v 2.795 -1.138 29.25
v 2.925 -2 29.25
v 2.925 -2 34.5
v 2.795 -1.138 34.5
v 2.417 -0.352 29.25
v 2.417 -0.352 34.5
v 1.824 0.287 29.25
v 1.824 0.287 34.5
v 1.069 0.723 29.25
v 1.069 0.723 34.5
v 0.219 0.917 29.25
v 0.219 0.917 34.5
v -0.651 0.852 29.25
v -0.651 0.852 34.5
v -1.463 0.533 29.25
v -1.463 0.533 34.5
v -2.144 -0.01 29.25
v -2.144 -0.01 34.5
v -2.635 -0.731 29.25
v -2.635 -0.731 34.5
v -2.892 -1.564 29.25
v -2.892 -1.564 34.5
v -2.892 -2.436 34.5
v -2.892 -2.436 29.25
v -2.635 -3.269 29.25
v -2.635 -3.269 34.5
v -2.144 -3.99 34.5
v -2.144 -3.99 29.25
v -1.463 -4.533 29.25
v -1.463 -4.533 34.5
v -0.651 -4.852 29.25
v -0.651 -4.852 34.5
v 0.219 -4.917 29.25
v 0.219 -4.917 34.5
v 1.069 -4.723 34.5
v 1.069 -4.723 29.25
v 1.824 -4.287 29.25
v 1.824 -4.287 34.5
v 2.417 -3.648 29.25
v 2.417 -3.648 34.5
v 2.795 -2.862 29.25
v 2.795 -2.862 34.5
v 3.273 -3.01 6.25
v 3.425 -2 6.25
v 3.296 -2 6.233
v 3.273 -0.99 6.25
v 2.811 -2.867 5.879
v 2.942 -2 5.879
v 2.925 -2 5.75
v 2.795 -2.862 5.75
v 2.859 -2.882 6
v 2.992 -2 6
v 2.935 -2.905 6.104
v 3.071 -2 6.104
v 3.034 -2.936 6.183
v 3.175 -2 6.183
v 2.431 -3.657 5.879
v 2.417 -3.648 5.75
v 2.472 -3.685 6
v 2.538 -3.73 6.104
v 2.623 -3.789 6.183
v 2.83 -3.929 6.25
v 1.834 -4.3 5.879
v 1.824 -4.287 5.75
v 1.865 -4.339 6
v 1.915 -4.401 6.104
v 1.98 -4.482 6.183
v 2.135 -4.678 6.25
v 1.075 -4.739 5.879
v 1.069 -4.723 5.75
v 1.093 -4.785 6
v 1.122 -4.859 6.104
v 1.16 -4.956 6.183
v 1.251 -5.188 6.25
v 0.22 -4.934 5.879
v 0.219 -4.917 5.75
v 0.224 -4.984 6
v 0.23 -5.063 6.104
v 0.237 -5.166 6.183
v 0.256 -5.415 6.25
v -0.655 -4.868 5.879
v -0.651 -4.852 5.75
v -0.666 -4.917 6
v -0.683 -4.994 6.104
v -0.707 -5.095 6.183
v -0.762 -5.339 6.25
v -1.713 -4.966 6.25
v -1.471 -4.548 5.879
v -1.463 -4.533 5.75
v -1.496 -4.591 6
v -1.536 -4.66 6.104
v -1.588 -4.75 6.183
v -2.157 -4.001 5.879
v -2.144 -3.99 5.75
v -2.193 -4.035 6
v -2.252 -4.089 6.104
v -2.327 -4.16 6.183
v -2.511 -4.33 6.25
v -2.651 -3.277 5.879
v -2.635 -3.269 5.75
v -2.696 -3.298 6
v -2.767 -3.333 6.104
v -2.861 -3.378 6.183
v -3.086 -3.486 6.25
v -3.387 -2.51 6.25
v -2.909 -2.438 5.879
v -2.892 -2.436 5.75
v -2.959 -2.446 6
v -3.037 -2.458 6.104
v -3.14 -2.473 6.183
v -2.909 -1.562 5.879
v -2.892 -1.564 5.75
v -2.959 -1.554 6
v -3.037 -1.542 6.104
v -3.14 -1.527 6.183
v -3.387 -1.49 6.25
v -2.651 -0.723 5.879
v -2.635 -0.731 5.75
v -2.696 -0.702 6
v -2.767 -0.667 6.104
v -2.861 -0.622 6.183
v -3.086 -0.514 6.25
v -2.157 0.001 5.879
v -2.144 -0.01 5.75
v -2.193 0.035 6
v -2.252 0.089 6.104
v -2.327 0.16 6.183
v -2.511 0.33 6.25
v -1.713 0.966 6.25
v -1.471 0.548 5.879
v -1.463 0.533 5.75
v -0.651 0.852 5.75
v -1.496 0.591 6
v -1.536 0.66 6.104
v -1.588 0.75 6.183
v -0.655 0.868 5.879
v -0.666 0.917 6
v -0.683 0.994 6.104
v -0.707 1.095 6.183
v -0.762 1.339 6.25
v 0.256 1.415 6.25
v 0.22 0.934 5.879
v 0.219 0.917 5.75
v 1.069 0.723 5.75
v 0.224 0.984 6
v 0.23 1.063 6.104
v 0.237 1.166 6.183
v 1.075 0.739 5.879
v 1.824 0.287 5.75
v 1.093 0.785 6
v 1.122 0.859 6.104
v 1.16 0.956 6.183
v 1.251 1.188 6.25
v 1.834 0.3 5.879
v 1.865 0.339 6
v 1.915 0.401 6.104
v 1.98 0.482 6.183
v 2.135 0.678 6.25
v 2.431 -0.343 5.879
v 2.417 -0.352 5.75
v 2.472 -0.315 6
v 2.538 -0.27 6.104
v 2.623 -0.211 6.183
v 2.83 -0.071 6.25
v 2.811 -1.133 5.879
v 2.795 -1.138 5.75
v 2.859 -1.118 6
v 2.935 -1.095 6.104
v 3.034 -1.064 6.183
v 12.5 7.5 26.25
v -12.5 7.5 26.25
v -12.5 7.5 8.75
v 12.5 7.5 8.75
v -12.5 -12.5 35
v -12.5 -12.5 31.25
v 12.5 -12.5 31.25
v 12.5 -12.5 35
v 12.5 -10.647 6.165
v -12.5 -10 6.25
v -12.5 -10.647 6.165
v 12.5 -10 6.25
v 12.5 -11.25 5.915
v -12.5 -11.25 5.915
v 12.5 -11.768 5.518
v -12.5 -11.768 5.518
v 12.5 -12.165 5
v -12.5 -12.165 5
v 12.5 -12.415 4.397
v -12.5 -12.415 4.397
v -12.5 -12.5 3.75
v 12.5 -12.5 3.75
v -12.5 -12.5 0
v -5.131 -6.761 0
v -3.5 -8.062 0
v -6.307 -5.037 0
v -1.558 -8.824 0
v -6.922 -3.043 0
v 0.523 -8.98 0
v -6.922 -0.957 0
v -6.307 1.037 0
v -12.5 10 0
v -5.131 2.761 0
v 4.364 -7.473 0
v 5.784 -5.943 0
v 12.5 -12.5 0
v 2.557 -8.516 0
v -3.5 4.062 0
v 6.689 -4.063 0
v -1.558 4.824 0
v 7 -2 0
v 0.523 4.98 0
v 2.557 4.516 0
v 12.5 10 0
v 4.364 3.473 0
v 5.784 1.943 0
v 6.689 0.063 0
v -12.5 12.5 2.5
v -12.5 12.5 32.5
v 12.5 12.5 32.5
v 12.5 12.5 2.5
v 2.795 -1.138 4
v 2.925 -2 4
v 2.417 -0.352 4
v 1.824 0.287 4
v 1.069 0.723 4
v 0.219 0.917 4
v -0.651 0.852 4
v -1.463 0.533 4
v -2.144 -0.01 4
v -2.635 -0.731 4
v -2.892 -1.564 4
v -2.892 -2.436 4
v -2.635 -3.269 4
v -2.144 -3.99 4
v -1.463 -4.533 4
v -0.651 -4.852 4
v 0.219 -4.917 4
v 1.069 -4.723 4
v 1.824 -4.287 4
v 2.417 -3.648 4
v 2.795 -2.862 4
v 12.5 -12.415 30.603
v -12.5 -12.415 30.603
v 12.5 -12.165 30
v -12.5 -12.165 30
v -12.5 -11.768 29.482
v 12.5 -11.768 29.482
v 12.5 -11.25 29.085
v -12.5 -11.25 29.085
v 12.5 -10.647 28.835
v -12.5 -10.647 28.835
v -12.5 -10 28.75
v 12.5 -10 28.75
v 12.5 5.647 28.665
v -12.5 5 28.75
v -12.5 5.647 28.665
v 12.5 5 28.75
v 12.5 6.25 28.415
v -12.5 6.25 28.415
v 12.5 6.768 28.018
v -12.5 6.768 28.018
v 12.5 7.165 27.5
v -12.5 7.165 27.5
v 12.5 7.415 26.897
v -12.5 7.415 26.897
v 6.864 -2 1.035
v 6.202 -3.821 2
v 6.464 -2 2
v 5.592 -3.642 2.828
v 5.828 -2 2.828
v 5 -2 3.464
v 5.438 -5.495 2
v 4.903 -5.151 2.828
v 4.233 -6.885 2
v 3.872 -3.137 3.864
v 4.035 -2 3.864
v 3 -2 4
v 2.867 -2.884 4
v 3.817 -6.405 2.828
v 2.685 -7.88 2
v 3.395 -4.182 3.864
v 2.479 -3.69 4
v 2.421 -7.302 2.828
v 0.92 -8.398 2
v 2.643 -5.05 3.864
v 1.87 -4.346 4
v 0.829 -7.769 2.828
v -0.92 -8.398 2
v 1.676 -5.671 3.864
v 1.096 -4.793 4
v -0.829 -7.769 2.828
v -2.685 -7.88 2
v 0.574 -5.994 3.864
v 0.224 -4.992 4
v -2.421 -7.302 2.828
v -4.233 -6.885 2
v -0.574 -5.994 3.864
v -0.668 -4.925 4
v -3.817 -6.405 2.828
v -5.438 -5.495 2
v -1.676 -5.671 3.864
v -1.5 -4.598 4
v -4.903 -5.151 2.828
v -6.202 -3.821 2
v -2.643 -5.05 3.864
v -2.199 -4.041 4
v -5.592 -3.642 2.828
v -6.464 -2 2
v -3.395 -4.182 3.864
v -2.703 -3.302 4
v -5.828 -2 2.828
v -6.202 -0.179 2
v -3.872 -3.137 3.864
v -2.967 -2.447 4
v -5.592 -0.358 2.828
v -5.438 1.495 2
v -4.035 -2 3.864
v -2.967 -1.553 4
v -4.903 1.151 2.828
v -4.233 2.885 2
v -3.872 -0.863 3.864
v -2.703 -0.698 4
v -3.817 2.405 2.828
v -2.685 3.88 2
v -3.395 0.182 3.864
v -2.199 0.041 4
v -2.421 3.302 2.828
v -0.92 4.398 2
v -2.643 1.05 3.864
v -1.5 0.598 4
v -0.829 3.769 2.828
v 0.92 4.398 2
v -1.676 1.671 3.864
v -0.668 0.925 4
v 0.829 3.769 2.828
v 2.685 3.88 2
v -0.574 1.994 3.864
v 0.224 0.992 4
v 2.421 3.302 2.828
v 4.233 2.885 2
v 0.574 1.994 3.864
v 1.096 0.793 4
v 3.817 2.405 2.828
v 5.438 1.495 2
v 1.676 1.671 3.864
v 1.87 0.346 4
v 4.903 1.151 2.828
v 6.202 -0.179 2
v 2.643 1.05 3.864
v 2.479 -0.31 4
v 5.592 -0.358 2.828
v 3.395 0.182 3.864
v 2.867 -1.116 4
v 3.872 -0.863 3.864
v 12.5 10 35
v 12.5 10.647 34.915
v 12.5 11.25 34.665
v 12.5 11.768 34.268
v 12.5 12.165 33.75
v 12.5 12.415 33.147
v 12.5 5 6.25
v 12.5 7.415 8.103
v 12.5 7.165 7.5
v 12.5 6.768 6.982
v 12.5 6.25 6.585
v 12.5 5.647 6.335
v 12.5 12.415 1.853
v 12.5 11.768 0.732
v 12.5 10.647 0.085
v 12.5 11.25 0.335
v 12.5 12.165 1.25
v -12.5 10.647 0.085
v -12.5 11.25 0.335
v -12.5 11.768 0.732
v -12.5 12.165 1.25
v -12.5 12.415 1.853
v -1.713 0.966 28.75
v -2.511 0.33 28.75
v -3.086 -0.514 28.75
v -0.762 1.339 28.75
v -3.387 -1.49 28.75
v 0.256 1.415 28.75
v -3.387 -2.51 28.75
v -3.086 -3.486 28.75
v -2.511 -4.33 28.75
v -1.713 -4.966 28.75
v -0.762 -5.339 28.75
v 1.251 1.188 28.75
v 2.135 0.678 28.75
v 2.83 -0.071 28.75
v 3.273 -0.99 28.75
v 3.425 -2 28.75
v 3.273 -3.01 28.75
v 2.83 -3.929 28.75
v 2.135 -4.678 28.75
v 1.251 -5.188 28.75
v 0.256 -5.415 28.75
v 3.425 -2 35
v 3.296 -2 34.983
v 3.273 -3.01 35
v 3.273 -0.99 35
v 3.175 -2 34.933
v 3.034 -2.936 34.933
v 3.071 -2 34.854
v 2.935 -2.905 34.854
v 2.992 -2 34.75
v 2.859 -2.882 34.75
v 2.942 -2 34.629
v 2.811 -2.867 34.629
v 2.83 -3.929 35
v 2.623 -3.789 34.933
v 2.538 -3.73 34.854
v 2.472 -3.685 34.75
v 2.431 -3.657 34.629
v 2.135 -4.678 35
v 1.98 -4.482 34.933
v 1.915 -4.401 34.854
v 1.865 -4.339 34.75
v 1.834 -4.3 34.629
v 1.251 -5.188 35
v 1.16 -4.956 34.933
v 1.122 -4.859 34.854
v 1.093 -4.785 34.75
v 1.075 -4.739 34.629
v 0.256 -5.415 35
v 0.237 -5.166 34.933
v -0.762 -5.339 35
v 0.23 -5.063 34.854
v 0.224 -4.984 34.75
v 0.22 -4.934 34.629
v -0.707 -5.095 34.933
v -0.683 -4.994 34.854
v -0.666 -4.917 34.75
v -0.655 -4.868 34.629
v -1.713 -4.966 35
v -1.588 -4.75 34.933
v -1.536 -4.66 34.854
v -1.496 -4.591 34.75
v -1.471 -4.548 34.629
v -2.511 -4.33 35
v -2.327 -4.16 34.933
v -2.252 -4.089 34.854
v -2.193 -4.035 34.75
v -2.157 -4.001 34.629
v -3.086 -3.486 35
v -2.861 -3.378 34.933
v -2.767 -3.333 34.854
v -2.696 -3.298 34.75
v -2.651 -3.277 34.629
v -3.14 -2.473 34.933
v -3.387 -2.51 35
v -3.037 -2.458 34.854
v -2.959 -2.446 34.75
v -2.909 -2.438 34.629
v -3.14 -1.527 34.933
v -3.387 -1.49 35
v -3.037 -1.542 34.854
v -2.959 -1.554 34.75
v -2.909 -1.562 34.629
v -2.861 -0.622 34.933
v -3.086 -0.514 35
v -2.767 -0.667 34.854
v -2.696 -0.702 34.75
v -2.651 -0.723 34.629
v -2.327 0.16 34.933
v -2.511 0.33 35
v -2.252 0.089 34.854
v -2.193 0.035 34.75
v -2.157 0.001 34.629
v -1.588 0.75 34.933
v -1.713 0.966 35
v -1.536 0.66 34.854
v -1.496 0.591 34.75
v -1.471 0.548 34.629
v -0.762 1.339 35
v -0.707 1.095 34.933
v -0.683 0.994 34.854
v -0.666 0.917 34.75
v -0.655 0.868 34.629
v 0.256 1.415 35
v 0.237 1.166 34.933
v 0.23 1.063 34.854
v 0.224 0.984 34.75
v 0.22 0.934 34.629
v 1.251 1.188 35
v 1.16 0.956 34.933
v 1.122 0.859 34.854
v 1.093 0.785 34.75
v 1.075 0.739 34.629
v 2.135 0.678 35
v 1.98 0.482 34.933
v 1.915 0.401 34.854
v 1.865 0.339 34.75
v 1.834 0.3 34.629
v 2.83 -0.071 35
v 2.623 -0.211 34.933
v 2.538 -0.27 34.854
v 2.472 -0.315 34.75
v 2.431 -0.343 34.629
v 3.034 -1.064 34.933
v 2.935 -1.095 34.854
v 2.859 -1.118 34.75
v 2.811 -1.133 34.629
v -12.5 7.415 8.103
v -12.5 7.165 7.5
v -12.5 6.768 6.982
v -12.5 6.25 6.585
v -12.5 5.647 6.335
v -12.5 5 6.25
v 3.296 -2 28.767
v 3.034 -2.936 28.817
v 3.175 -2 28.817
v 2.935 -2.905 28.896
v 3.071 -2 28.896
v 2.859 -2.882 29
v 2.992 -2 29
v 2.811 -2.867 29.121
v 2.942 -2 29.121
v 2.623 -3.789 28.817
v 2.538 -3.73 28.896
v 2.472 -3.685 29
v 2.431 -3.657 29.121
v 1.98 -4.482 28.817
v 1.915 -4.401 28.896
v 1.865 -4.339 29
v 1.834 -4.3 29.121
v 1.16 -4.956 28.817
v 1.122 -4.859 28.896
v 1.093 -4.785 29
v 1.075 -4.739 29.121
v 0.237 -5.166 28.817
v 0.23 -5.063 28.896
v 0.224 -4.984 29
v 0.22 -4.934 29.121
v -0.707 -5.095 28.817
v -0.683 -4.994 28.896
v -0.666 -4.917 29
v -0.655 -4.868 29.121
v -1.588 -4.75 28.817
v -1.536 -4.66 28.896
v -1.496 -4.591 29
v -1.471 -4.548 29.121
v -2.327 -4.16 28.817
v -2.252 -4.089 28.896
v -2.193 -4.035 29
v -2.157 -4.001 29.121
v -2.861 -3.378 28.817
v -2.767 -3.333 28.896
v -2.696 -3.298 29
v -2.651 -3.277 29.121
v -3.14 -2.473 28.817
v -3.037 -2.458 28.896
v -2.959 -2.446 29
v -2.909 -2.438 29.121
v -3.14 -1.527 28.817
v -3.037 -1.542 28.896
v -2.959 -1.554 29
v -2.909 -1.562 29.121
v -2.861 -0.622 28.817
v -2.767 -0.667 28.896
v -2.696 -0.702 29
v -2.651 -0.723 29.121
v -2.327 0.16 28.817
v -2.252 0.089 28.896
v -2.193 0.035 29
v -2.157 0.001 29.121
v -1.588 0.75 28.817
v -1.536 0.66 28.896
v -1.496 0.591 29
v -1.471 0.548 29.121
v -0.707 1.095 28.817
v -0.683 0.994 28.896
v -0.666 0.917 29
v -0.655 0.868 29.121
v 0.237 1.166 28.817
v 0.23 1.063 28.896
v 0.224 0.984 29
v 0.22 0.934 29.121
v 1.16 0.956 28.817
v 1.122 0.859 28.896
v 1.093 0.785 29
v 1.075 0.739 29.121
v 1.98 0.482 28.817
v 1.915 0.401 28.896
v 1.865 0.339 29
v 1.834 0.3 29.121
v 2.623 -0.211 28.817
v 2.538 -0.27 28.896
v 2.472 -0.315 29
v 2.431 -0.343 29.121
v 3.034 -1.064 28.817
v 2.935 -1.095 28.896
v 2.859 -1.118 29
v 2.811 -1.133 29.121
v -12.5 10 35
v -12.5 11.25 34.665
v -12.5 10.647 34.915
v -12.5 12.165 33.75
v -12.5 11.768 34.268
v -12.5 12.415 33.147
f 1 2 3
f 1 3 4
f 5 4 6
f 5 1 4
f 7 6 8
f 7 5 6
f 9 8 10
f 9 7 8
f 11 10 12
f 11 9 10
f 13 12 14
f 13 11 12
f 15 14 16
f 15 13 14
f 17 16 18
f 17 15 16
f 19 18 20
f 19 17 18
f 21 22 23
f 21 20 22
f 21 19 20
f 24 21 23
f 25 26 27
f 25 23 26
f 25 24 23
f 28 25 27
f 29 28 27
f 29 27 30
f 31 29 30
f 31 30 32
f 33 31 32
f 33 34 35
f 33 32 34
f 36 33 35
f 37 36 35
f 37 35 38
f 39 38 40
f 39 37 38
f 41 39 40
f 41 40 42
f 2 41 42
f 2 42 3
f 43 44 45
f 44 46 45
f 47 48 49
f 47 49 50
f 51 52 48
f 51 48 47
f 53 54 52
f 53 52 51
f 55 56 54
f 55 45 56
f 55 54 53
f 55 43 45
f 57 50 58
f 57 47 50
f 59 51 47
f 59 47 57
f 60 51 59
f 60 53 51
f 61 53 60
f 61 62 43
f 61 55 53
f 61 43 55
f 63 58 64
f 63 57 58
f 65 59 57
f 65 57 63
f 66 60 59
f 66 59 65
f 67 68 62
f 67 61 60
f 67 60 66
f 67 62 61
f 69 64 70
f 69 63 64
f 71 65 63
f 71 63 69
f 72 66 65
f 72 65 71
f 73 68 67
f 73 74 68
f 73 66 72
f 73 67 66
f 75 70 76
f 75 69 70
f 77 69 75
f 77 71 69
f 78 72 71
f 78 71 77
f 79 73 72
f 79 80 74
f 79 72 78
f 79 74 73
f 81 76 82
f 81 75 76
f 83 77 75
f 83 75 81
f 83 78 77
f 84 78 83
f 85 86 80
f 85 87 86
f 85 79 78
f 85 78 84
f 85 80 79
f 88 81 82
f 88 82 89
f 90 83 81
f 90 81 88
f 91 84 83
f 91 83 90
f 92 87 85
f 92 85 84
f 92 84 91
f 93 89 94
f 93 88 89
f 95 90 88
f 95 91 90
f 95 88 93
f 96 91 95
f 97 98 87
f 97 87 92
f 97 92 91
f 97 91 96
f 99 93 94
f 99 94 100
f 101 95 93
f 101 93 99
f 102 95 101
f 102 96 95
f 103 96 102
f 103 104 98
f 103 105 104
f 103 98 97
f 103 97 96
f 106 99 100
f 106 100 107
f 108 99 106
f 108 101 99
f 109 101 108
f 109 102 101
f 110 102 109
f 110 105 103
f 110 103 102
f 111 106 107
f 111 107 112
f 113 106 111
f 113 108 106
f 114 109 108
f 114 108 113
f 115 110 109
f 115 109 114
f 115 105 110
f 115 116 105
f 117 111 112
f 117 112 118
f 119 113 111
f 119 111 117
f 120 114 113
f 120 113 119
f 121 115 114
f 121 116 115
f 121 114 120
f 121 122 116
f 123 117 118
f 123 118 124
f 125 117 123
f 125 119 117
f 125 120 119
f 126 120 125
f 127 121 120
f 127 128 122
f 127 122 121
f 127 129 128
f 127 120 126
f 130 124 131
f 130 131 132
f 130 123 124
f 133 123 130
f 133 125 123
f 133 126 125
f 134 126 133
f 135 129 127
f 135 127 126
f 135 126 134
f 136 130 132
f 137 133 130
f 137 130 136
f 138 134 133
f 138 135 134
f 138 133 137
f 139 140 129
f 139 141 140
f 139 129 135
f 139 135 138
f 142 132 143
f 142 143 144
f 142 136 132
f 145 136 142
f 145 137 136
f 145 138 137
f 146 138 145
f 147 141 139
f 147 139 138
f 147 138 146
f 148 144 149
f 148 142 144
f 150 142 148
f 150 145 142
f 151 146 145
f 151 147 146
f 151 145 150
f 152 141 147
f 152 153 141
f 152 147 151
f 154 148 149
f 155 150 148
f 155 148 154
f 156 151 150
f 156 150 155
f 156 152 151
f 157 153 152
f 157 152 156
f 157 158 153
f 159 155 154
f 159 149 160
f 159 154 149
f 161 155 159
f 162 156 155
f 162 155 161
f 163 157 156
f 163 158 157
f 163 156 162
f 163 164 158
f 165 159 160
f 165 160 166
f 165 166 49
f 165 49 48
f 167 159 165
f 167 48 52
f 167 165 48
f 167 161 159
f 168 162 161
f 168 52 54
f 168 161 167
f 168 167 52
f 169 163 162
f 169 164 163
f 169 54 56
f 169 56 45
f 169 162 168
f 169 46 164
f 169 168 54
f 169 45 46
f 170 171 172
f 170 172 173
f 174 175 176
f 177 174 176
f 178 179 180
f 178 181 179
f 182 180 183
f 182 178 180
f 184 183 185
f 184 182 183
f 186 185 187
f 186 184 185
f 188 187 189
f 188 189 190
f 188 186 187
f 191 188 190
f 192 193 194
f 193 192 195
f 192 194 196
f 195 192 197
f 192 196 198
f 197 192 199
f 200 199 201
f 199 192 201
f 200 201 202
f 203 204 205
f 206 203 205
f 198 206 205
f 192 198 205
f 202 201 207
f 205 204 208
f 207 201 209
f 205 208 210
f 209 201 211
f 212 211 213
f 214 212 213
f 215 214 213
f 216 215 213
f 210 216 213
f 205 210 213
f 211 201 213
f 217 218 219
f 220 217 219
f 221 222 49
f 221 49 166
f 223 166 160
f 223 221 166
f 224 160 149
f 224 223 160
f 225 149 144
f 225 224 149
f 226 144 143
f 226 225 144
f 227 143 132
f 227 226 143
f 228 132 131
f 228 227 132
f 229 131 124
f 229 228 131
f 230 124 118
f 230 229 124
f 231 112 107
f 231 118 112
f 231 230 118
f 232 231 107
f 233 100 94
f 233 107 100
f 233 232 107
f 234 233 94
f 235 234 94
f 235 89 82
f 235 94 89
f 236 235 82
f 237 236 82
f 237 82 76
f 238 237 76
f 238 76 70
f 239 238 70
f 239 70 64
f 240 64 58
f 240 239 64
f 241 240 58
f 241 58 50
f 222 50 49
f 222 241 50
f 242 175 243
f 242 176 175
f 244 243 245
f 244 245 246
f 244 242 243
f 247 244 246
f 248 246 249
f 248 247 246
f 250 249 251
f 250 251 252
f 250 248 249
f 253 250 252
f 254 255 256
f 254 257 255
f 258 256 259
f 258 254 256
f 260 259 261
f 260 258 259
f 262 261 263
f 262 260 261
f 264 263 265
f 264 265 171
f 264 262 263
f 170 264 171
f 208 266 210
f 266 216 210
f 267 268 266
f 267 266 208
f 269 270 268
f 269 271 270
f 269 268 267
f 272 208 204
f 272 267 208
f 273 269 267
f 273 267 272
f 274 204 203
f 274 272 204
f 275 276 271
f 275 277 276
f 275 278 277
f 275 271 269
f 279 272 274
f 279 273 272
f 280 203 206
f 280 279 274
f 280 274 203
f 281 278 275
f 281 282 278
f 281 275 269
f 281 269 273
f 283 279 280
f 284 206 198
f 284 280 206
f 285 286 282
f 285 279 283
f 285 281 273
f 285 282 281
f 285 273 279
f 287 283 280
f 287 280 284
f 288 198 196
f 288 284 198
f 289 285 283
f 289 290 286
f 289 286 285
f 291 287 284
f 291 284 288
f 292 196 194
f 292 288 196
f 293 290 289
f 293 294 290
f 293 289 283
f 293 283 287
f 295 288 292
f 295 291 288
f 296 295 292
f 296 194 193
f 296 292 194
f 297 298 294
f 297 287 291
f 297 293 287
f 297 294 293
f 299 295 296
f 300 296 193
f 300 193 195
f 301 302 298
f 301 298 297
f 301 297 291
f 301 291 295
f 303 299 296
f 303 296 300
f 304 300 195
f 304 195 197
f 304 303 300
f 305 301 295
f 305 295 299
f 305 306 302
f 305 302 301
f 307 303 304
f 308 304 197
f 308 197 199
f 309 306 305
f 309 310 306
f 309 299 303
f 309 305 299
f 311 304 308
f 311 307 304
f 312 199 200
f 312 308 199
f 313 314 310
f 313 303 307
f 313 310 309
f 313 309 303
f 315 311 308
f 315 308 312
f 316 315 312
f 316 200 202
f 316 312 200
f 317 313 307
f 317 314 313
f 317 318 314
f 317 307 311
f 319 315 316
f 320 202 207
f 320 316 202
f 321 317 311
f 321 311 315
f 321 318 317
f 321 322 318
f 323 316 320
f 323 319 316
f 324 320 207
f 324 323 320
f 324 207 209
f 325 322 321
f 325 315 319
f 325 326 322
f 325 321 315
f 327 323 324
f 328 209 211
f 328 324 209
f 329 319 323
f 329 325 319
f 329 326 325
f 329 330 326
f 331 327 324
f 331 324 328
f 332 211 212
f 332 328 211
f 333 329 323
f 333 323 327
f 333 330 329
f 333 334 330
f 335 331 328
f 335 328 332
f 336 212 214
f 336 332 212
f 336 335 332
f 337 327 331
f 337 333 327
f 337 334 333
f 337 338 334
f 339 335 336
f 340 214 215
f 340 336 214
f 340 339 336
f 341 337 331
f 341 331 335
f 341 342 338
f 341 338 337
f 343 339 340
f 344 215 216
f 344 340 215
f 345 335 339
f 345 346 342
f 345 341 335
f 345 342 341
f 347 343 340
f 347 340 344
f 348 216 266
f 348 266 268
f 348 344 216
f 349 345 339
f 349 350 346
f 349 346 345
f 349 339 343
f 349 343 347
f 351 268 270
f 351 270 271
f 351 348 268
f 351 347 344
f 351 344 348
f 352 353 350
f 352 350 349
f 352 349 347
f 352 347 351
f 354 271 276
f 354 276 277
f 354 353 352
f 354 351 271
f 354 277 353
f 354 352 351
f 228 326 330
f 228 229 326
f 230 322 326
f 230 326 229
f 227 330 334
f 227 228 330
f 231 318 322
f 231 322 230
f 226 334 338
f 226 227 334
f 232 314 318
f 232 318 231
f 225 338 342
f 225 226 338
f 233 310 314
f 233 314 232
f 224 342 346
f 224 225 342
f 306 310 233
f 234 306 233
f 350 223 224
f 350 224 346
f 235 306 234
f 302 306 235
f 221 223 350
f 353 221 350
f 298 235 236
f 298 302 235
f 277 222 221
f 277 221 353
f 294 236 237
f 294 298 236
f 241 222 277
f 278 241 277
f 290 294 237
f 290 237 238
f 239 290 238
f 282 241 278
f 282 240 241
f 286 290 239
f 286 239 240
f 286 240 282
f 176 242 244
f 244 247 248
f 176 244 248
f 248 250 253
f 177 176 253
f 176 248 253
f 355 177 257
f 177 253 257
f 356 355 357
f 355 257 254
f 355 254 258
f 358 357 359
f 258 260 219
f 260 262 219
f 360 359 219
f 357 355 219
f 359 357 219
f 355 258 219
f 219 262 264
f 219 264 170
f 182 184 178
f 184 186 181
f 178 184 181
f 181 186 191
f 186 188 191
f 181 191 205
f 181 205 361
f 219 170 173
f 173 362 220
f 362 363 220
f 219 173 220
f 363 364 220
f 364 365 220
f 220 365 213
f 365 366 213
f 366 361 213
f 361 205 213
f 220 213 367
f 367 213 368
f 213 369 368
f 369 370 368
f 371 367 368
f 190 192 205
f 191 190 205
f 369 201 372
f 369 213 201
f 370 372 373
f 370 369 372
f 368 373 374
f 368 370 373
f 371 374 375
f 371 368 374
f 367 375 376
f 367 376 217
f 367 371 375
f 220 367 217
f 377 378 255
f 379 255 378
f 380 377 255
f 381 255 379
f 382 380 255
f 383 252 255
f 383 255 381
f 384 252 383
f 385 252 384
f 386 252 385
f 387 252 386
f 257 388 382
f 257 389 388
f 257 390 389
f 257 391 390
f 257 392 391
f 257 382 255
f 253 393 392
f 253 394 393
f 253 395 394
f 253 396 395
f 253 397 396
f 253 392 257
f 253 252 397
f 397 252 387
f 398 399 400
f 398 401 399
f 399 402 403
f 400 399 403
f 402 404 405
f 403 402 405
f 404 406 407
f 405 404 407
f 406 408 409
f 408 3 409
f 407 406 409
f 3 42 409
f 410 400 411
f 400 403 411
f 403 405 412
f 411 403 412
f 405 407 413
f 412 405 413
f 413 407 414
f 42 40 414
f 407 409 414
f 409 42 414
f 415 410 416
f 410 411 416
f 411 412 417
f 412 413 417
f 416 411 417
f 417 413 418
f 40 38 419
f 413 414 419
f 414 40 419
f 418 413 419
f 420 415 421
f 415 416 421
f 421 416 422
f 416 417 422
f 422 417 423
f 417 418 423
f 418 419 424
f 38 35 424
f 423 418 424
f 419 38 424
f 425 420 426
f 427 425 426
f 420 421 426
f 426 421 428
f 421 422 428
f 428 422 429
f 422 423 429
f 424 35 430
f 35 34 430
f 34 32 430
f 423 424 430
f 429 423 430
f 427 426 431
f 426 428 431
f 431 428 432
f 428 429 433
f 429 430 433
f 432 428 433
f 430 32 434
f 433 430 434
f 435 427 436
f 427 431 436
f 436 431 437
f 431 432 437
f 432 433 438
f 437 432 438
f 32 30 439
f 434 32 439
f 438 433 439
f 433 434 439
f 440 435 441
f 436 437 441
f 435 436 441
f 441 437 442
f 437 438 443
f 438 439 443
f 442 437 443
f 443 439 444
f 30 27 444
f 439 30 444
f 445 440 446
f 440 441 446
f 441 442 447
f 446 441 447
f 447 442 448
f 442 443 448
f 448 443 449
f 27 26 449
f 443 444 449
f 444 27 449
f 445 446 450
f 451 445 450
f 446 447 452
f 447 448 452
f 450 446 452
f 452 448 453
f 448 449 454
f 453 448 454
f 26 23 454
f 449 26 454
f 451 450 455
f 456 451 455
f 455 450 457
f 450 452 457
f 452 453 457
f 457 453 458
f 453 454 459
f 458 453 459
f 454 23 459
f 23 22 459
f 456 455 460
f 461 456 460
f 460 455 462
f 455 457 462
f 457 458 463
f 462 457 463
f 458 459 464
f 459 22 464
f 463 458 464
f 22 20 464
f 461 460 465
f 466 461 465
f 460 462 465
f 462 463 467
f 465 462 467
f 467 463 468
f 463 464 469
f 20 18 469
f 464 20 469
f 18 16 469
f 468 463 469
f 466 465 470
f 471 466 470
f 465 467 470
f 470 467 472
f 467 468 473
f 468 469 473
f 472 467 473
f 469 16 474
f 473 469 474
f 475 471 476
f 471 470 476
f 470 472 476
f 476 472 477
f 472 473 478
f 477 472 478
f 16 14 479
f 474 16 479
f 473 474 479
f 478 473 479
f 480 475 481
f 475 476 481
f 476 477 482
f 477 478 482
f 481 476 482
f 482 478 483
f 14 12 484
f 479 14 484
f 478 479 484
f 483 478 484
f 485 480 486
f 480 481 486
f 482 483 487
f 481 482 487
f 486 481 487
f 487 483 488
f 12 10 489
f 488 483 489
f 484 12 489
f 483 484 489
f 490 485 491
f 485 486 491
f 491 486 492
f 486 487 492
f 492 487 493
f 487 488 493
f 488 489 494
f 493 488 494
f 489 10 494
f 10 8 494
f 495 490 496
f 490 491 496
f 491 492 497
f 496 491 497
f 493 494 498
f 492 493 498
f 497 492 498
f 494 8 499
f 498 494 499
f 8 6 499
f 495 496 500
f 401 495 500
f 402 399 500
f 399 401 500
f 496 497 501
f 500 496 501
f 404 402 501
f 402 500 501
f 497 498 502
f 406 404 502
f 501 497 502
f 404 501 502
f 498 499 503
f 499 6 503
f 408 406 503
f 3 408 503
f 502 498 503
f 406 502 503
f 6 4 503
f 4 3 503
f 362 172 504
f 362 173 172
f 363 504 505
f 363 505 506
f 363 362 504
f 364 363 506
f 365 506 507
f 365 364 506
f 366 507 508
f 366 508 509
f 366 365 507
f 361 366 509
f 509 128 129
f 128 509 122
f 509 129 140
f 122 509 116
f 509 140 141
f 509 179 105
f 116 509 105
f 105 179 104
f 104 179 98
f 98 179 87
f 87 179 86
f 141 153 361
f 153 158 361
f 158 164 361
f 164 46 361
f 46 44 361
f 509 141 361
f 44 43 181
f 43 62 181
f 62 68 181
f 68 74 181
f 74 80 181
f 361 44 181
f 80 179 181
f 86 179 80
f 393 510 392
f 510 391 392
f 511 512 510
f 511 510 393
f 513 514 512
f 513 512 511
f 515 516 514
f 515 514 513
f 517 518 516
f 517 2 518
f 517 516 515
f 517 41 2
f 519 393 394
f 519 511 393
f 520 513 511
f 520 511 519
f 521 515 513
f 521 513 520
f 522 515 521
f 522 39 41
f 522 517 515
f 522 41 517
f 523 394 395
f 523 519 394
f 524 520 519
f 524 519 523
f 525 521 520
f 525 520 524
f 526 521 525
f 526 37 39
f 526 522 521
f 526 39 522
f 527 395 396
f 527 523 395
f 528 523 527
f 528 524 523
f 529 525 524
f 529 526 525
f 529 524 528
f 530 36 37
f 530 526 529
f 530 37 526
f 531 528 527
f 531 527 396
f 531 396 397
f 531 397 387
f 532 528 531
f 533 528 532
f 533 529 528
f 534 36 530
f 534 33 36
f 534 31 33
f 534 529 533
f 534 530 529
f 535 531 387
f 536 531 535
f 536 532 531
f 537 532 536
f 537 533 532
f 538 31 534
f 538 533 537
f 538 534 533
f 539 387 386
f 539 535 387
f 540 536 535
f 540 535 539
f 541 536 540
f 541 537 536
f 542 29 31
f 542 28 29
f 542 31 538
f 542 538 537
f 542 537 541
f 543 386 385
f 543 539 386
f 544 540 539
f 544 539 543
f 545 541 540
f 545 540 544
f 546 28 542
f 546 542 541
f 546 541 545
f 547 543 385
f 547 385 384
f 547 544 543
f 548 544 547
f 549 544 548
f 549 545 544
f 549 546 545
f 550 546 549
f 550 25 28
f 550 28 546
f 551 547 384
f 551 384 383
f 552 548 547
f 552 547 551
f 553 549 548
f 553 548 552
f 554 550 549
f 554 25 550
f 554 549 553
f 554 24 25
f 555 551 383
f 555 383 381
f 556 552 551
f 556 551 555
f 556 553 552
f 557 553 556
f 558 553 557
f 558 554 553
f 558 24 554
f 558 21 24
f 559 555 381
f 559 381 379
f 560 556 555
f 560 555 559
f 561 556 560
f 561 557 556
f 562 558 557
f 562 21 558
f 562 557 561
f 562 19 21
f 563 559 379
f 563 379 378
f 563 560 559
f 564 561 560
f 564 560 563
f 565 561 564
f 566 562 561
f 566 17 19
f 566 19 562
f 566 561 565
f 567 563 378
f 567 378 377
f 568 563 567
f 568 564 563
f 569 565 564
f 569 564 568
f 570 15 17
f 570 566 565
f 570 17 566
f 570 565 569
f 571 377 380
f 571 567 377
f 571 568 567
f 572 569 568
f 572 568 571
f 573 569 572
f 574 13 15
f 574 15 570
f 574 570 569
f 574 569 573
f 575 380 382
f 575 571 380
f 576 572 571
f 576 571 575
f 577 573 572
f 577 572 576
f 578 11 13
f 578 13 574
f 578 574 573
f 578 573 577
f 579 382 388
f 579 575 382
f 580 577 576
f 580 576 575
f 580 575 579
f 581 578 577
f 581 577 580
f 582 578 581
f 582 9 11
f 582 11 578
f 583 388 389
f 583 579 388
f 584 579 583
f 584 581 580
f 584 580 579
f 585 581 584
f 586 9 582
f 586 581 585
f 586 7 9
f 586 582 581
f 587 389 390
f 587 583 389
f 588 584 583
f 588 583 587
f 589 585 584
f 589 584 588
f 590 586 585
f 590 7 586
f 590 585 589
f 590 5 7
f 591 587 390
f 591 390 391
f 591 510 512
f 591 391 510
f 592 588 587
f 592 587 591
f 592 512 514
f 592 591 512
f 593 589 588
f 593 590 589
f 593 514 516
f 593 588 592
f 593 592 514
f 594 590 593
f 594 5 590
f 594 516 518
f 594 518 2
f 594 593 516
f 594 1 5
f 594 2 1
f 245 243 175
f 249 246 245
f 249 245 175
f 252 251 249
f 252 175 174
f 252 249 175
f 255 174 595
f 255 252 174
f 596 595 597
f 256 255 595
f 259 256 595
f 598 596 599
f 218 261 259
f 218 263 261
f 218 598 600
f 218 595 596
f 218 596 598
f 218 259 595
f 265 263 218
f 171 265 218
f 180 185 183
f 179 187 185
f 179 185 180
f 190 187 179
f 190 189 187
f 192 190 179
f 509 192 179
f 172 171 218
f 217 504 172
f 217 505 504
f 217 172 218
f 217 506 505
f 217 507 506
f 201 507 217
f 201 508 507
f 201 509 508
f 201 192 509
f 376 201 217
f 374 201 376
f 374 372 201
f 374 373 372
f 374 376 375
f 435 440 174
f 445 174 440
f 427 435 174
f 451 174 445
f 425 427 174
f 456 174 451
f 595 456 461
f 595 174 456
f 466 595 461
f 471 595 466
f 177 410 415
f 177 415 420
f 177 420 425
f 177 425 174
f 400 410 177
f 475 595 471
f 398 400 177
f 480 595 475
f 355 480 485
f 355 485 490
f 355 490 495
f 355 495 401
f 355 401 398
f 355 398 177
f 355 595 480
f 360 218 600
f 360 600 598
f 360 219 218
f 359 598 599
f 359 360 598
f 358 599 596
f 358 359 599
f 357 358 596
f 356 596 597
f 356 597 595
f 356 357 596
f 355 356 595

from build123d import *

# Parameters (mm, degrees)
F0_W     = 25
F0_H     = 25
F0_R     = 7
F0_R_2   = 2.925
F1_DEPTH = 35
F2_W     = 25
F2_H     = 22.5
F3_DEPTH = 20
F4_DEPTH = 35.001
F5_R     = 7
F6_DEPTH = 4
F7_R     = 2.5
F8_R     = 3.99999
F9_R     = 0.5


# Not quite as in the source:
# - a fillet or chamfer is up to 0.001 mm smaller than in the source, because OpenCascade refuses the exact size


with BuildPart() as f1:
    # F0 (on Top) → F1 (new body)
    with BuildSketch(Plane.XY):
        Rectangle(F0_W, F0_H)
        with Locations((0, -2)):
            Circle(F0_R, mode=Mode.SUBTRACT)
        with Locations((0, -2)):
            Circle(F0_R)
        with Locations((0, -2)):
            Circle(F0_R_2, mode=Mode.SUBTRACT)
        with Locations((0, -2)):
            Circle(F0_R_2)
    extrude(amount=F1_DEPTH)

    # F2 (on face) → F3 (cut)
    with BuildSketch(Plane.XZ.offset(12.5)):
        with Locations((0, 17.5)):
            Rectangle(F2_W, F2_H)
    extrude(amount=-F3_DEPTH, mode=Mode.SUBTRACT)

    # F0 (on Top) → F4 (cut, through all)
    with BuildSketch(Plane.XY):
        with Locations((0, -2)):
            Circle(F0_R_2)
    extrude(amount=F4_DEPTH, mode=Mode.SUBTRACT)

    # F5 (on face) → F6 (cut)
    with BuildSketch(Plane(origin=(0, 0, 0), x_dir=(1, 0, 0), z_dir=(0, 0, -1))):
        with Locations((0, 2)):
            Circle(F5_R)
    extrude(amount=-F6_DEPTH, mode=Mode.SUBTRACT)

    # F7
    f7_edges = [f1.edges().sort_by_distance(p)[0] for p in [
        (0, 7.5, 6.25),
        (0, 7.5, 28.75),
        (0, 12.5, 35),
        (0, 12.5, 0),
        (0, -12.5, 28.75),
        (0, -12.5, 6.25),
    ]]
    fillet(f7_edges, radius=F7_R)

    # F8 (radius 4 in the source; OpenCascade refuses exactly that, so slightly less here)
    f8_edges = [f1.edges().sort_by_distance(p)[0] for p in [
        (-7, -2, 4),
    ]]
    fillet(f8_edges, radius=F8_R)

    # F9
    f9_edges = [f1.edges().sort_by_distance(p)[0] for p in [
        (-2.925, -2, 35),
        (-2.925, -2, 28.75),
        (-2.925, -2, 6.25),
    ]]
    fillet(f9_edges, radius=F9_R)


solid = f1.part
